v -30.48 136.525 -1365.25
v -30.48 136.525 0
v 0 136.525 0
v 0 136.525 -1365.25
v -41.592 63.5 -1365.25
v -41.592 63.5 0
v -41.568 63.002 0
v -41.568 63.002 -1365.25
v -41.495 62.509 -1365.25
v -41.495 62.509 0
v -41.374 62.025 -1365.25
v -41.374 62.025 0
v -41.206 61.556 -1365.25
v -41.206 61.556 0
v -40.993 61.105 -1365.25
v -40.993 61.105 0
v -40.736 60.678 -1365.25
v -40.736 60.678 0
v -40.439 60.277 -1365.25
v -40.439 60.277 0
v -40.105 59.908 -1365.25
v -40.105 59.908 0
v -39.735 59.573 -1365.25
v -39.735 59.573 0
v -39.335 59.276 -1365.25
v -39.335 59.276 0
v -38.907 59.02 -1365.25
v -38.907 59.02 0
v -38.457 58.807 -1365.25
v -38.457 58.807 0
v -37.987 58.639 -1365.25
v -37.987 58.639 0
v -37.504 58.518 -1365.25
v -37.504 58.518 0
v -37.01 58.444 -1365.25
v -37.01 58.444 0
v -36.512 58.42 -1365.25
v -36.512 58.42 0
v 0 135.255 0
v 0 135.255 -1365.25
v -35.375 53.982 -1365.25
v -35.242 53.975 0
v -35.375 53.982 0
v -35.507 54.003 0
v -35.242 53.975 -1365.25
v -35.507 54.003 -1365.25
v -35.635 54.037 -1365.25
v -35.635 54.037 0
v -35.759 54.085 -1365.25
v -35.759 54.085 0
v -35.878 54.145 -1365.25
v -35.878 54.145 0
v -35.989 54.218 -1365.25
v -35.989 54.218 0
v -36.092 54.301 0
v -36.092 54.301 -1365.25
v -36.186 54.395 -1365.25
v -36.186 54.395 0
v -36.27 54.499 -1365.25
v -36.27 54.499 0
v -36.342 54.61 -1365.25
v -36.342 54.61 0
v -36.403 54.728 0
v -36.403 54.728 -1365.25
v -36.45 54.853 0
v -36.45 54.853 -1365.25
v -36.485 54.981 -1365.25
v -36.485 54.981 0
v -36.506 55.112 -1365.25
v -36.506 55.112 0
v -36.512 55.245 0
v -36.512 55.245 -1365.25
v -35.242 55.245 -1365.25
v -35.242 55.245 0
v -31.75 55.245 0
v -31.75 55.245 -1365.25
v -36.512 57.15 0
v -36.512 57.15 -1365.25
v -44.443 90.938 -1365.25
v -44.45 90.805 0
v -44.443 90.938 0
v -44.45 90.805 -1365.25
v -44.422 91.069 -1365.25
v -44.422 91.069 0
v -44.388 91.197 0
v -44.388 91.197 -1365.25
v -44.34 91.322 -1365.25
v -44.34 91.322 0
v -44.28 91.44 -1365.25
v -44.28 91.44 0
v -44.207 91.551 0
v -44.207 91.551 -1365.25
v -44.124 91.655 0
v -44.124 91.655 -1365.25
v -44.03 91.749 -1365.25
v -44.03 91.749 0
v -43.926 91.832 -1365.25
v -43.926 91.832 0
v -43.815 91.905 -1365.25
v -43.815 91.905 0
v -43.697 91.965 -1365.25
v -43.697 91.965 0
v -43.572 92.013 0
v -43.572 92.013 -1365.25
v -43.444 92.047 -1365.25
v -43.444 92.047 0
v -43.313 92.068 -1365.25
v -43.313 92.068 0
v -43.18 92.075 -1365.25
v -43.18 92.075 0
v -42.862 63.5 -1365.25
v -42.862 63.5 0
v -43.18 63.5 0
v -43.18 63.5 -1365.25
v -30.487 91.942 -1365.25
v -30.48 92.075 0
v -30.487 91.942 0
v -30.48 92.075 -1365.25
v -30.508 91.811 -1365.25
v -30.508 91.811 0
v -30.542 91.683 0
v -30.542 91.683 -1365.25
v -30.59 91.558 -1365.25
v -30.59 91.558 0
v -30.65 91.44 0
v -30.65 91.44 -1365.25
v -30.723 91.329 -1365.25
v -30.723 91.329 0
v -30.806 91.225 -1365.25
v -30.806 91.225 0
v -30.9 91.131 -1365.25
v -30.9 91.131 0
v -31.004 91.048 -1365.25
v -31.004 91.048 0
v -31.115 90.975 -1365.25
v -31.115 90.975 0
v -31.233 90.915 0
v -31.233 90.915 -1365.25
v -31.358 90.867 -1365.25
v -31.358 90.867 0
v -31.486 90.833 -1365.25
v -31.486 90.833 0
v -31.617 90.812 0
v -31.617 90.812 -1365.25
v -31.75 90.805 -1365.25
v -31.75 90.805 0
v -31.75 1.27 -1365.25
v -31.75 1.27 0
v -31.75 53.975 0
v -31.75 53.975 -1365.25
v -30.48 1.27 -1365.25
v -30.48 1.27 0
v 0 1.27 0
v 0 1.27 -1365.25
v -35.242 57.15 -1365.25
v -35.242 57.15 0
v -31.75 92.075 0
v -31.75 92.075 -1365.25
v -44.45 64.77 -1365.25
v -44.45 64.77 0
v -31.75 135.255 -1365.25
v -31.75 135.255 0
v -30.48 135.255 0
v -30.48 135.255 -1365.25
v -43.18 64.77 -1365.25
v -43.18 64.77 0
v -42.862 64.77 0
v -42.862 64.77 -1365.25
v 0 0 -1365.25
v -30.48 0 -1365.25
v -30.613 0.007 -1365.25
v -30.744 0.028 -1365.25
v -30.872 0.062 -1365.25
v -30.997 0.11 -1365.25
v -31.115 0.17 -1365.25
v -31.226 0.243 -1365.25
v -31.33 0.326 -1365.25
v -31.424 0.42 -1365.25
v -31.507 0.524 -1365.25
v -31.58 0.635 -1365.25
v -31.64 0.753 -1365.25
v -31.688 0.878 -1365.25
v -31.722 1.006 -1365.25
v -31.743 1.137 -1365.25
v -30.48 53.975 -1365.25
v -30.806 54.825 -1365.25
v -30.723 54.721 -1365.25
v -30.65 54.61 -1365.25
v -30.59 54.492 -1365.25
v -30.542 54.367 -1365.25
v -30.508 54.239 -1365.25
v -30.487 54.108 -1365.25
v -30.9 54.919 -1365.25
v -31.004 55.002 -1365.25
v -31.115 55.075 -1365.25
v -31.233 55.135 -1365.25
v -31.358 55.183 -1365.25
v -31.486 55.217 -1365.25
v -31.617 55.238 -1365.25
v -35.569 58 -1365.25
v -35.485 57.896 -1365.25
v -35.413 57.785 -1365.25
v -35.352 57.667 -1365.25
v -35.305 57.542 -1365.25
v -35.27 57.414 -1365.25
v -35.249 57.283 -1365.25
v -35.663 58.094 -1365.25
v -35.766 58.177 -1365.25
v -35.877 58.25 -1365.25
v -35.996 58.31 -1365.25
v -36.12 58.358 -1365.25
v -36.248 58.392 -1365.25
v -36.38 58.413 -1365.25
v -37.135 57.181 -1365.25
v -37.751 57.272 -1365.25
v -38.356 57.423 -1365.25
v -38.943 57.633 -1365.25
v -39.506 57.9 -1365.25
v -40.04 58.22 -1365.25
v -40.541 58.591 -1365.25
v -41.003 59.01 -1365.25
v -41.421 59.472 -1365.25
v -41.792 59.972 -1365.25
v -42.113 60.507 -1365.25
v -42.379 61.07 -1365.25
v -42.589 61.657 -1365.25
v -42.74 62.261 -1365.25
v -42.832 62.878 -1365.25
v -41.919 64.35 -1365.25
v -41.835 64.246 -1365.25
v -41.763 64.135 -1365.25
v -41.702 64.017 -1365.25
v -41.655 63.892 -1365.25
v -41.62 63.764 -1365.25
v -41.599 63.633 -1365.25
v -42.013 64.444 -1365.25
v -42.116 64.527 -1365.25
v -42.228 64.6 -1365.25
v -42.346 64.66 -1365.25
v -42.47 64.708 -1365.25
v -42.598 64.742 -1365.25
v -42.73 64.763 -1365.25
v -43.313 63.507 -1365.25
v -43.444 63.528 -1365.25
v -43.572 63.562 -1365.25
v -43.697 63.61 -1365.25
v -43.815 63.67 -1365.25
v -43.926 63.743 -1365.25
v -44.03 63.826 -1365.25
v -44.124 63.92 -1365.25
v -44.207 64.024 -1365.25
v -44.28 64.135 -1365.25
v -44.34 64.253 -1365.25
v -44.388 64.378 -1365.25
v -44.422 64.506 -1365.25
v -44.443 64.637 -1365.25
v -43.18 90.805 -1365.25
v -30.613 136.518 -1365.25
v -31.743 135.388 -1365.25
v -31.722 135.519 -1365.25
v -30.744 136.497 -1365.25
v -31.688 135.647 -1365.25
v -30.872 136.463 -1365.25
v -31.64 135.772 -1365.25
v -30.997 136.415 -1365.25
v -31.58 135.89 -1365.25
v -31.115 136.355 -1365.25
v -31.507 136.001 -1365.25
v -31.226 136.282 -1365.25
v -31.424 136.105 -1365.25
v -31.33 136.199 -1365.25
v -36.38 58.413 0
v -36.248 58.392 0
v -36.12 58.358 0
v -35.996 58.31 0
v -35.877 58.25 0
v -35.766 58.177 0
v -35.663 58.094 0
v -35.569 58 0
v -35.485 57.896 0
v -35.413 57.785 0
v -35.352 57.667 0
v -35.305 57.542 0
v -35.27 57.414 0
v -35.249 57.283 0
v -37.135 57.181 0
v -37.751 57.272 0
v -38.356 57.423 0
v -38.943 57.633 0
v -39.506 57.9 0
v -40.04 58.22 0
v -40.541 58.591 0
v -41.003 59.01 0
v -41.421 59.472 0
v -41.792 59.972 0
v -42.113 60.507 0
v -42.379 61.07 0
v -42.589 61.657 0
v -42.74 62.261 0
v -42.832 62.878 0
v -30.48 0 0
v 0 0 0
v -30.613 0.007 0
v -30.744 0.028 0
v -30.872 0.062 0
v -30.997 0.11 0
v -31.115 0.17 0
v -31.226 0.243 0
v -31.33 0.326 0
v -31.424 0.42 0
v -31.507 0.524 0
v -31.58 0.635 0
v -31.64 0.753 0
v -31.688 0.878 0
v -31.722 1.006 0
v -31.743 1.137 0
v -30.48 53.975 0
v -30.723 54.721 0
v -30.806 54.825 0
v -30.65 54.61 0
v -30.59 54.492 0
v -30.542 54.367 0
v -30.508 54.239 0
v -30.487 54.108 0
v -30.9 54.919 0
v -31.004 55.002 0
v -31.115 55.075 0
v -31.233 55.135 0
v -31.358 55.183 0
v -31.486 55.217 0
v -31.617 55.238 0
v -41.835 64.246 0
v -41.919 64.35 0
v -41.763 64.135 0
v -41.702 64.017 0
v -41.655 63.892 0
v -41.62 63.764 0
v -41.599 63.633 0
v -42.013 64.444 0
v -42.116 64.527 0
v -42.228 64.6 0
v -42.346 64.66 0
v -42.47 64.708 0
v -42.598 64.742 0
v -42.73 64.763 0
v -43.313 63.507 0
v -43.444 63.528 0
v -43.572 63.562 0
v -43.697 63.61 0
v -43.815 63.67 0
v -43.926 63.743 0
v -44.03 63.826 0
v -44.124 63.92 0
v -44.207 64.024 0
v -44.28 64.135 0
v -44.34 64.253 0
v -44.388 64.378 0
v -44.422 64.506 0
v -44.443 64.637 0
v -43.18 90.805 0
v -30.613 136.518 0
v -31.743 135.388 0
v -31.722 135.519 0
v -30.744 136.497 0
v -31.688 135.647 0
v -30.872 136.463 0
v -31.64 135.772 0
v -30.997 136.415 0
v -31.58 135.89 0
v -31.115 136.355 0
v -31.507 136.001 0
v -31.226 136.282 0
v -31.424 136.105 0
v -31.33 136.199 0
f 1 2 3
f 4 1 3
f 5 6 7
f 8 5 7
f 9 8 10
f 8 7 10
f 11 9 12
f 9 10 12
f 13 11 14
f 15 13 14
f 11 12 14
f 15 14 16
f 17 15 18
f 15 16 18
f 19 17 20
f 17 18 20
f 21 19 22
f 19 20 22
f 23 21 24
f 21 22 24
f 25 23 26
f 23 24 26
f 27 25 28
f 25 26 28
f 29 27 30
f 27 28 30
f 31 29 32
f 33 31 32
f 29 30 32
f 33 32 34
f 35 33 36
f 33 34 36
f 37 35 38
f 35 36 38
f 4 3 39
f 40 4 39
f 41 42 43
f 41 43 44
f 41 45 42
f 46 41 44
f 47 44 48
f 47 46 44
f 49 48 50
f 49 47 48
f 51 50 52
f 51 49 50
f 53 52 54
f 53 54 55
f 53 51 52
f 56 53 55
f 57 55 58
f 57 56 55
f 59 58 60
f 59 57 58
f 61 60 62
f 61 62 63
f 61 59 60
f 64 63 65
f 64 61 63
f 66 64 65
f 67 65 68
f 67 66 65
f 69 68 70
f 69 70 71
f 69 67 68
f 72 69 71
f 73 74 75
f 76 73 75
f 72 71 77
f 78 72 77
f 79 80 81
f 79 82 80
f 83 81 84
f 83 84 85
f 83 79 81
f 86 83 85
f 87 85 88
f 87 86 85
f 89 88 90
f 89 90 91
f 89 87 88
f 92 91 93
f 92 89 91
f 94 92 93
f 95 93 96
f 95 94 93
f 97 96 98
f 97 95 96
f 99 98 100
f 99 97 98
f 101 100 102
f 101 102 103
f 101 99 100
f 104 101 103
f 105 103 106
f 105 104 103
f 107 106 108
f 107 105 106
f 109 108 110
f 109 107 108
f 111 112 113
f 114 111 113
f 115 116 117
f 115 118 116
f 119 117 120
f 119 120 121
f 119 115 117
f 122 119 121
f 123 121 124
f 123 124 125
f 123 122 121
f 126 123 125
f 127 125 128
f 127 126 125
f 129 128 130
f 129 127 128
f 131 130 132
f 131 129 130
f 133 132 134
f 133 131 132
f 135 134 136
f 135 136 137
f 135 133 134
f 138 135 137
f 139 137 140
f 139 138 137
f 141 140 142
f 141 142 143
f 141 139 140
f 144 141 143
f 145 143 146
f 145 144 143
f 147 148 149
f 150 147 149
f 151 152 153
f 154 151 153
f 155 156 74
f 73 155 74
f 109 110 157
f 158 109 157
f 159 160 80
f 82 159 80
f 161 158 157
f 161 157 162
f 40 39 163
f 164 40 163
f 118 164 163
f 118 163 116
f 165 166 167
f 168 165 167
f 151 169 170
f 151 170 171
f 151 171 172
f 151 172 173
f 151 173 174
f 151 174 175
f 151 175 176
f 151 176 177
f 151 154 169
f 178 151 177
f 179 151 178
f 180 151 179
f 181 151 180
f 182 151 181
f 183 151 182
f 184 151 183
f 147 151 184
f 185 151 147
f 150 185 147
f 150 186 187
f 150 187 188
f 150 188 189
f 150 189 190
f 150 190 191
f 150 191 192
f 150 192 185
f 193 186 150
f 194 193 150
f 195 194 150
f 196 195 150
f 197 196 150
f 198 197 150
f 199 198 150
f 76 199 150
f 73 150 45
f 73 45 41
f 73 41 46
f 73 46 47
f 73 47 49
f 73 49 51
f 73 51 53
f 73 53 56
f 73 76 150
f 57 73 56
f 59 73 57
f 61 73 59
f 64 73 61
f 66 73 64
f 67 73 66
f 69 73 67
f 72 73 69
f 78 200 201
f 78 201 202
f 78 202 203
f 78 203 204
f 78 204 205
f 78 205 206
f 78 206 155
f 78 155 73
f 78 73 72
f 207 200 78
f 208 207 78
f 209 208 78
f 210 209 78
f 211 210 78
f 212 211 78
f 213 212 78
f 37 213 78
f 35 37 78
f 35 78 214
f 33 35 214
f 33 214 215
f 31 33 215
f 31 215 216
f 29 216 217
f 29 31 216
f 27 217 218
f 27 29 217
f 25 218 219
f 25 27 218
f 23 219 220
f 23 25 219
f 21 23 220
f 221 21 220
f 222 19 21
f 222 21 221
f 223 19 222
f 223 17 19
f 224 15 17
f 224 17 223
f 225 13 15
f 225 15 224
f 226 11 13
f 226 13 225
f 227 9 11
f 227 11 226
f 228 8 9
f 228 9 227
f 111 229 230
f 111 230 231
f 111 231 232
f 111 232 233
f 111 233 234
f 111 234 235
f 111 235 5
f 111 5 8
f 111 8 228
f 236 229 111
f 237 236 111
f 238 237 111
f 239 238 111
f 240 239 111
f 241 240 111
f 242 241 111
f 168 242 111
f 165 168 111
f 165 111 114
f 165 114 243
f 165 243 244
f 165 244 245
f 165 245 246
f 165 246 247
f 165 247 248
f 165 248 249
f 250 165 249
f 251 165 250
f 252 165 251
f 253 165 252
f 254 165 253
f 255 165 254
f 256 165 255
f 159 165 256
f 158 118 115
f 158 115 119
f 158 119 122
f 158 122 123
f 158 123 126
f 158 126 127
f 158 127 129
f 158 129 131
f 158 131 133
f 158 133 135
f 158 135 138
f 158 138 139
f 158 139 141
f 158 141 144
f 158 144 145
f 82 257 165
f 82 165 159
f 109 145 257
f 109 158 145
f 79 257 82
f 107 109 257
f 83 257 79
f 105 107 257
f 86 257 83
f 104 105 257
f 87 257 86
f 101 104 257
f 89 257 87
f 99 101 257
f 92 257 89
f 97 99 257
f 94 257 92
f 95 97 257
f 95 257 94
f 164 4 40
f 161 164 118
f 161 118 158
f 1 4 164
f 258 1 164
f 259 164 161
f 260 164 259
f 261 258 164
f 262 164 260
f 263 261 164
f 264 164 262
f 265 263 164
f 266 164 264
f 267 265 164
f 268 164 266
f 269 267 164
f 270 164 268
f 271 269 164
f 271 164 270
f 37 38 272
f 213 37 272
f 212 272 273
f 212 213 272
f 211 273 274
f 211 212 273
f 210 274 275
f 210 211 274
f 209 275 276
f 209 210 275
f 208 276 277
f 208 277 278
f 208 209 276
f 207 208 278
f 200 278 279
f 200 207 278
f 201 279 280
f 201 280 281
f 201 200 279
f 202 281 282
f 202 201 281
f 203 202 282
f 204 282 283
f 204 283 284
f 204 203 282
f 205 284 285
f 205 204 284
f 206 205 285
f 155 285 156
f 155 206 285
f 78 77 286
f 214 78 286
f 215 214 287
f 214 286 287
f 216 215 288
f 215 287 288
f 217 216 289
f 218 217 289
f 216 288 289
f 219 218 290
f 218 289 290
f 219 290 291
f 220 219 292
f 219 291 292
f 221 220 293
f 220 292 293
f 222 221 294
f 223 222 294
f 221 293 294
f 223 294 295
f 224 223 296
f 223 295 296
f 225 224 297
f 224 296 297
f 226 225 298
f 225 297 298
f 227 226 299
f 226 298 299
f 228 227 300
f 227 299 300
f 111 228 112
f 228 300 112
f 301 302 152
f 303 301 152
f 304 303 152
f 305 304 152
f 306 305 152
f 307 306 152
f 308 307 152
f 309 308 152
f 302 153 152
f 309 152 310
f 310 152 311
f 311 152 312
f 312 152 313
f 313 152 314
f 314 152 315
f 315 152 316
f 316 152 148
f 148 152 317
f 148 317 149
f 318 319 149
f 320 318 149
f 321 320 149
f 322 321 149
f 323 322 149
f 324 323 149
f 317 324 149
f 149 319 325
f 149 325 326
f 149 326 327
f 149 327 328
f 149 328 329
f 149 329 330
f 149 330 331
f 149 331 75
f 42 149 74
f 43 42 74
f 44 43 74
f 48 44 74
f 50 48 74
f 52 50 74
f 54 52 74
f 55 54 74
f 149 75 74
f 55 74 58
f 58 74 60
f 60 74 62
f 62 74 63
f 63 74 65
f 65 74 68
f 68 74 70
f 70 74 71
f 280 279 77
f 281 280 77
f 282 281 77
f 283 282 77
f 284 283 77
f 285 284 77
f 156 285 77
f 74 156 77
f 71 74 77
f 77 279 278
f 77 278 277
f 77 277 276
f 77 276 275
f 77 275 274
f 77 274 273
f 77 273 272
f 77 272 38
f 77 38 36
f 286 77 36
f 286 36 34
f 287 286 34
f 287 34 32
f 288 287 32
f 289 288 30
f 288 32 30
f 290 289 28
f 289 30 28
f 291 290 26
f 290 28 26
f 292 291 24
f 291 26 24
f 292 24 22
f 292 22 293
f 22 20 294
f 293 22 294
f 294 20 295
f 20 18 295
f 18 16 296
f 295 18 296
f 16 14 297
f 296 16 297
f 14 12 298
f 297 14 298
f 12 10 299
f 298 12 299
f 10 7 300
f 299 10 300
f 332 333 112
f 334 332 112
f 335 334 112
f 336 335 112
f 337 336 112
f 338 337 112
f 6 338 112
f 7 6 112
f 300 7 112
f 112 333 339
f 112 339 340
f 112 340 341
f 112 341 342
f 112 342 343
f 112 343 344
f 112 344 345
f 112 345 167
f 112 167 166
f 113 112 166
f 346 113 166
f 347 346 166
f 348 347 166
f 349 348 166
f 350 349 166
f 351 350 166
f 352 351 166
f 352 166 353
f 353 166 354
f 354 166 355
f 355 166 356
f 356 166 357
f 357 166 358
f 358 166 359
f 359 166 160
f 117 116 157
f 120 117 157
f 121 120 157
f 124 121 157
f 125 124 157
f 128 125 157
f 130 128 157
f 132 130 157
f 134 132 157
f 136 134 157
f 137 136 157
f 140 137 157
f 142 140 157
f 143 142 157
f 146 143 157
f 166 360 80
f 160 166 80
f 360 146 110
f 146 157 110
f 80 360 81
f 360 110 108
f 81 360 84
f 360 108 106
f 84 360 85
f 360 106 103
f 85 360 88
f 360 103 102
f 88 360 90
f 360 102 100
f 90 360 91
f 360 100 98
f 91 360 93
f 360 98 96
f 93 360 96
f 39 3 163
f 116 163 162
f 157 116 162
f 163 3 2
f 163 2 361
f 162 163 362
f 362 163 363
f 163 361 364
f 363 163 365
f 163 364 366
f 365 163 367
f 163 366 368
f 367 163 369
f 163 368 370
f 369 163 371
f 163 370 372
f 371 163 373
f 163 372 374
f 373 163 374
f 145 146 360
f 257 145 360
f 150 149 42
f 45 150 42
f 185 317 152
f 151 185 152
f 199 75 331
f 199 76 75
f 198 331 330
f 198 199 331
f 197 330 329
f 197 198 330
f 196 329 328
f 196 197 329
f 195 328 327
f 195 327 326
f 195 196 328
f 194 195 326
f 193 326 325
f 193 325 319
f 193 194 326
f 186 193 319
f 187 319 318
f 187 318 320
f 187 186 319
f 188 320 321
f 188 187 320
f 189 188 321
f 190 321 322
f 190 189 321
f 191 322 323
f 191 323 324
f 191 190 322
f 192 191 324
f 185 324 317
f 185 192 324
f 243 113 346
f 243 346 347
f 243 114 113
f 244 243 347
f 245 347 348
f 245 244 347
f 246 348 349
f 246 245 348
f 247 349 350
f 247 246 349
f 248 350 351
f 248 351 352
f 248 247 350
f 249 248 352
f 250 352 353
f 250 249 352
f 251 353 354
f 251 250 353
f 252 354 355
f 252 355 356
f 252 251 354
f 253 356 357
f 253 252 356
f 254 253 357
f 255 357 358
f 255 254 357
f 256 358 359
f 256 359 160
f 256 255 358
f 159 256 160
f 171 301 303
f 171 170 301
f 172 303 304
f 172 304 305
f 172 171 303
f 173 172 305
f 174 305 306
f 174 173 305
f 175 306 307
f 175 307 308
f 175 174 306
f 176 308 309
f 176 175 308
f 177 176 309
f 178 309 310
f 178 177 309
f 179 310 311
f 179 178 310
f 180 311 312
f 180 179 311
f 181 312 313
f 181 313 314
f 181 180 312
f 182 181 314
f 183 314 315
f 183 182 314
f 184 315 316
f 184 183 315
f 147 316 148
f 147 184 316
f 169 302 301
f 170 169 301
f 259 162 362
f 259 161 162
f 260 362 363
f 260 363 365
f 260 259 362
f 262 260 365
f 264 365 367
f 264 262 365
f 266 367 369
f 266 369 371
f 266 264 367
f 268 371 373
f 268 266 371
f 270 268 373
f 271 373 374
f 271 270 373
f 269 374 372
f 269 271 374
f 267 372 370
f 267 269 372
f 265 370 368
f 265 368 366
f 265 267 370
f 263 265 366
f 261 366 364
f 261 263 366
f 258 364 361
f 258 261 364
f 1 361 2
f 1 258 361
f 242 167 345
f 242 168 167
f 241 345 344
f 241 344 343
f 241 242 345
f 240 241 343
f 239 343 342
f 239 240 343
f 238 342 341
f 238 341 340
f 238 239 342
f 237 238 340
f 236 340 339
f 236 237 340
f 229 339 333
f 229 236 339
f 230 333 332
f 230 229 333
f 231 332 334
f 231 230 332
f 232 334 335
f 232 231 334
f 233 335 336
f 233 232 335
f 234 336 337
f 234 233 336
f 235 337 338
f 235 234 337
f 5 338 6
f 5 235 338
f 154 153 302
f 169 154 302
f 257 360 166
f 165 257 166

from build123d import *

# Parameters (mm, degrees)
EXTRUDE_THIN1_DEPTH = 1365.25
FILLET1_R           = 1.27


with BuildPart() as part:
    # Sketch1 → Extrude-Thin1 (new body)
    with BuildSketch(Plane.XY):
        with BuildLine():
            Line((0, 0), (-31.75, 0))
            Line((-31.75, 0), (-31.75, 53.975))
            Line((-31.75, 53.975), (-36.5125, 53.975))
            Line((-36.5125, 53.975), (-36.5125, 57.15))
            ThreePointArc((-36.5125, 57.15), (-41.002628061, 59.009871939), (-42.8625, 63.5))
            Line((-42.8625, 63.5), (-44.45, 63.5))
            Line((-44.45, 63.5), (-44.45, 92.075))
            Line((-44.45, 92.075), (-31.75, 92.075))
            Line((-31.75, 92.075), (-31.75, 136.525))
            Line((-31.75, 136.525), (0, 136.525))
            Line((0, 136.525), (0, 135.255))
            Line((0, 135.255), (-30.48, 135.255))
            Line((-30.48, 135.255), (-30.48, 90.805))
            Line((-30.48, 90.805), (-43.18, 90.805))
            Line((-43.18, 90.805), (-43.18, 64.77))
            Line((-43.18, 64.77), (-41.43118885, 64.77))
            ThreePointArc((-41.43118885, 64.77), (-40.104602448, 59.907897552), (-35.2425, 58.58131115))
            Line((-35.2425, 58.58131115), (-35.2425, 55.245))
            Line((-35.2425, 55.245), (-30.48, 55.245))
            Line((-30.48, 55.245), (-30.48, 1.27))
            Line((-30.48, 1.27), (0, 1.27))
            Line((0, 1.27), (0, 0))
        make_face()
    extrude(amount=-EXTRUDE_THIN1_DEPTH)

    # Fillet1
    fillet1_edges = [part.edges().sort_by_distance(p)[0] for p in [
        (-30.48, 90.805, -682.625),
        (-41.43118885, 64.77, -682.625),
        (-35.2425, 58.58131115, -682.625),
        (-30.48, 55.245, -682.625),
        (-31.75, 0, -682.625),
        (-36.5125, 53.975, -682.625),
        (-44.45, 63.5, -682.625),
        (-44.45, 92.075, -682.625),
        (-31.75, 136.525, -682.625),
    ]]
    fillet(fillet1_edges, radius=FILLET1_R)


solid = part.part
